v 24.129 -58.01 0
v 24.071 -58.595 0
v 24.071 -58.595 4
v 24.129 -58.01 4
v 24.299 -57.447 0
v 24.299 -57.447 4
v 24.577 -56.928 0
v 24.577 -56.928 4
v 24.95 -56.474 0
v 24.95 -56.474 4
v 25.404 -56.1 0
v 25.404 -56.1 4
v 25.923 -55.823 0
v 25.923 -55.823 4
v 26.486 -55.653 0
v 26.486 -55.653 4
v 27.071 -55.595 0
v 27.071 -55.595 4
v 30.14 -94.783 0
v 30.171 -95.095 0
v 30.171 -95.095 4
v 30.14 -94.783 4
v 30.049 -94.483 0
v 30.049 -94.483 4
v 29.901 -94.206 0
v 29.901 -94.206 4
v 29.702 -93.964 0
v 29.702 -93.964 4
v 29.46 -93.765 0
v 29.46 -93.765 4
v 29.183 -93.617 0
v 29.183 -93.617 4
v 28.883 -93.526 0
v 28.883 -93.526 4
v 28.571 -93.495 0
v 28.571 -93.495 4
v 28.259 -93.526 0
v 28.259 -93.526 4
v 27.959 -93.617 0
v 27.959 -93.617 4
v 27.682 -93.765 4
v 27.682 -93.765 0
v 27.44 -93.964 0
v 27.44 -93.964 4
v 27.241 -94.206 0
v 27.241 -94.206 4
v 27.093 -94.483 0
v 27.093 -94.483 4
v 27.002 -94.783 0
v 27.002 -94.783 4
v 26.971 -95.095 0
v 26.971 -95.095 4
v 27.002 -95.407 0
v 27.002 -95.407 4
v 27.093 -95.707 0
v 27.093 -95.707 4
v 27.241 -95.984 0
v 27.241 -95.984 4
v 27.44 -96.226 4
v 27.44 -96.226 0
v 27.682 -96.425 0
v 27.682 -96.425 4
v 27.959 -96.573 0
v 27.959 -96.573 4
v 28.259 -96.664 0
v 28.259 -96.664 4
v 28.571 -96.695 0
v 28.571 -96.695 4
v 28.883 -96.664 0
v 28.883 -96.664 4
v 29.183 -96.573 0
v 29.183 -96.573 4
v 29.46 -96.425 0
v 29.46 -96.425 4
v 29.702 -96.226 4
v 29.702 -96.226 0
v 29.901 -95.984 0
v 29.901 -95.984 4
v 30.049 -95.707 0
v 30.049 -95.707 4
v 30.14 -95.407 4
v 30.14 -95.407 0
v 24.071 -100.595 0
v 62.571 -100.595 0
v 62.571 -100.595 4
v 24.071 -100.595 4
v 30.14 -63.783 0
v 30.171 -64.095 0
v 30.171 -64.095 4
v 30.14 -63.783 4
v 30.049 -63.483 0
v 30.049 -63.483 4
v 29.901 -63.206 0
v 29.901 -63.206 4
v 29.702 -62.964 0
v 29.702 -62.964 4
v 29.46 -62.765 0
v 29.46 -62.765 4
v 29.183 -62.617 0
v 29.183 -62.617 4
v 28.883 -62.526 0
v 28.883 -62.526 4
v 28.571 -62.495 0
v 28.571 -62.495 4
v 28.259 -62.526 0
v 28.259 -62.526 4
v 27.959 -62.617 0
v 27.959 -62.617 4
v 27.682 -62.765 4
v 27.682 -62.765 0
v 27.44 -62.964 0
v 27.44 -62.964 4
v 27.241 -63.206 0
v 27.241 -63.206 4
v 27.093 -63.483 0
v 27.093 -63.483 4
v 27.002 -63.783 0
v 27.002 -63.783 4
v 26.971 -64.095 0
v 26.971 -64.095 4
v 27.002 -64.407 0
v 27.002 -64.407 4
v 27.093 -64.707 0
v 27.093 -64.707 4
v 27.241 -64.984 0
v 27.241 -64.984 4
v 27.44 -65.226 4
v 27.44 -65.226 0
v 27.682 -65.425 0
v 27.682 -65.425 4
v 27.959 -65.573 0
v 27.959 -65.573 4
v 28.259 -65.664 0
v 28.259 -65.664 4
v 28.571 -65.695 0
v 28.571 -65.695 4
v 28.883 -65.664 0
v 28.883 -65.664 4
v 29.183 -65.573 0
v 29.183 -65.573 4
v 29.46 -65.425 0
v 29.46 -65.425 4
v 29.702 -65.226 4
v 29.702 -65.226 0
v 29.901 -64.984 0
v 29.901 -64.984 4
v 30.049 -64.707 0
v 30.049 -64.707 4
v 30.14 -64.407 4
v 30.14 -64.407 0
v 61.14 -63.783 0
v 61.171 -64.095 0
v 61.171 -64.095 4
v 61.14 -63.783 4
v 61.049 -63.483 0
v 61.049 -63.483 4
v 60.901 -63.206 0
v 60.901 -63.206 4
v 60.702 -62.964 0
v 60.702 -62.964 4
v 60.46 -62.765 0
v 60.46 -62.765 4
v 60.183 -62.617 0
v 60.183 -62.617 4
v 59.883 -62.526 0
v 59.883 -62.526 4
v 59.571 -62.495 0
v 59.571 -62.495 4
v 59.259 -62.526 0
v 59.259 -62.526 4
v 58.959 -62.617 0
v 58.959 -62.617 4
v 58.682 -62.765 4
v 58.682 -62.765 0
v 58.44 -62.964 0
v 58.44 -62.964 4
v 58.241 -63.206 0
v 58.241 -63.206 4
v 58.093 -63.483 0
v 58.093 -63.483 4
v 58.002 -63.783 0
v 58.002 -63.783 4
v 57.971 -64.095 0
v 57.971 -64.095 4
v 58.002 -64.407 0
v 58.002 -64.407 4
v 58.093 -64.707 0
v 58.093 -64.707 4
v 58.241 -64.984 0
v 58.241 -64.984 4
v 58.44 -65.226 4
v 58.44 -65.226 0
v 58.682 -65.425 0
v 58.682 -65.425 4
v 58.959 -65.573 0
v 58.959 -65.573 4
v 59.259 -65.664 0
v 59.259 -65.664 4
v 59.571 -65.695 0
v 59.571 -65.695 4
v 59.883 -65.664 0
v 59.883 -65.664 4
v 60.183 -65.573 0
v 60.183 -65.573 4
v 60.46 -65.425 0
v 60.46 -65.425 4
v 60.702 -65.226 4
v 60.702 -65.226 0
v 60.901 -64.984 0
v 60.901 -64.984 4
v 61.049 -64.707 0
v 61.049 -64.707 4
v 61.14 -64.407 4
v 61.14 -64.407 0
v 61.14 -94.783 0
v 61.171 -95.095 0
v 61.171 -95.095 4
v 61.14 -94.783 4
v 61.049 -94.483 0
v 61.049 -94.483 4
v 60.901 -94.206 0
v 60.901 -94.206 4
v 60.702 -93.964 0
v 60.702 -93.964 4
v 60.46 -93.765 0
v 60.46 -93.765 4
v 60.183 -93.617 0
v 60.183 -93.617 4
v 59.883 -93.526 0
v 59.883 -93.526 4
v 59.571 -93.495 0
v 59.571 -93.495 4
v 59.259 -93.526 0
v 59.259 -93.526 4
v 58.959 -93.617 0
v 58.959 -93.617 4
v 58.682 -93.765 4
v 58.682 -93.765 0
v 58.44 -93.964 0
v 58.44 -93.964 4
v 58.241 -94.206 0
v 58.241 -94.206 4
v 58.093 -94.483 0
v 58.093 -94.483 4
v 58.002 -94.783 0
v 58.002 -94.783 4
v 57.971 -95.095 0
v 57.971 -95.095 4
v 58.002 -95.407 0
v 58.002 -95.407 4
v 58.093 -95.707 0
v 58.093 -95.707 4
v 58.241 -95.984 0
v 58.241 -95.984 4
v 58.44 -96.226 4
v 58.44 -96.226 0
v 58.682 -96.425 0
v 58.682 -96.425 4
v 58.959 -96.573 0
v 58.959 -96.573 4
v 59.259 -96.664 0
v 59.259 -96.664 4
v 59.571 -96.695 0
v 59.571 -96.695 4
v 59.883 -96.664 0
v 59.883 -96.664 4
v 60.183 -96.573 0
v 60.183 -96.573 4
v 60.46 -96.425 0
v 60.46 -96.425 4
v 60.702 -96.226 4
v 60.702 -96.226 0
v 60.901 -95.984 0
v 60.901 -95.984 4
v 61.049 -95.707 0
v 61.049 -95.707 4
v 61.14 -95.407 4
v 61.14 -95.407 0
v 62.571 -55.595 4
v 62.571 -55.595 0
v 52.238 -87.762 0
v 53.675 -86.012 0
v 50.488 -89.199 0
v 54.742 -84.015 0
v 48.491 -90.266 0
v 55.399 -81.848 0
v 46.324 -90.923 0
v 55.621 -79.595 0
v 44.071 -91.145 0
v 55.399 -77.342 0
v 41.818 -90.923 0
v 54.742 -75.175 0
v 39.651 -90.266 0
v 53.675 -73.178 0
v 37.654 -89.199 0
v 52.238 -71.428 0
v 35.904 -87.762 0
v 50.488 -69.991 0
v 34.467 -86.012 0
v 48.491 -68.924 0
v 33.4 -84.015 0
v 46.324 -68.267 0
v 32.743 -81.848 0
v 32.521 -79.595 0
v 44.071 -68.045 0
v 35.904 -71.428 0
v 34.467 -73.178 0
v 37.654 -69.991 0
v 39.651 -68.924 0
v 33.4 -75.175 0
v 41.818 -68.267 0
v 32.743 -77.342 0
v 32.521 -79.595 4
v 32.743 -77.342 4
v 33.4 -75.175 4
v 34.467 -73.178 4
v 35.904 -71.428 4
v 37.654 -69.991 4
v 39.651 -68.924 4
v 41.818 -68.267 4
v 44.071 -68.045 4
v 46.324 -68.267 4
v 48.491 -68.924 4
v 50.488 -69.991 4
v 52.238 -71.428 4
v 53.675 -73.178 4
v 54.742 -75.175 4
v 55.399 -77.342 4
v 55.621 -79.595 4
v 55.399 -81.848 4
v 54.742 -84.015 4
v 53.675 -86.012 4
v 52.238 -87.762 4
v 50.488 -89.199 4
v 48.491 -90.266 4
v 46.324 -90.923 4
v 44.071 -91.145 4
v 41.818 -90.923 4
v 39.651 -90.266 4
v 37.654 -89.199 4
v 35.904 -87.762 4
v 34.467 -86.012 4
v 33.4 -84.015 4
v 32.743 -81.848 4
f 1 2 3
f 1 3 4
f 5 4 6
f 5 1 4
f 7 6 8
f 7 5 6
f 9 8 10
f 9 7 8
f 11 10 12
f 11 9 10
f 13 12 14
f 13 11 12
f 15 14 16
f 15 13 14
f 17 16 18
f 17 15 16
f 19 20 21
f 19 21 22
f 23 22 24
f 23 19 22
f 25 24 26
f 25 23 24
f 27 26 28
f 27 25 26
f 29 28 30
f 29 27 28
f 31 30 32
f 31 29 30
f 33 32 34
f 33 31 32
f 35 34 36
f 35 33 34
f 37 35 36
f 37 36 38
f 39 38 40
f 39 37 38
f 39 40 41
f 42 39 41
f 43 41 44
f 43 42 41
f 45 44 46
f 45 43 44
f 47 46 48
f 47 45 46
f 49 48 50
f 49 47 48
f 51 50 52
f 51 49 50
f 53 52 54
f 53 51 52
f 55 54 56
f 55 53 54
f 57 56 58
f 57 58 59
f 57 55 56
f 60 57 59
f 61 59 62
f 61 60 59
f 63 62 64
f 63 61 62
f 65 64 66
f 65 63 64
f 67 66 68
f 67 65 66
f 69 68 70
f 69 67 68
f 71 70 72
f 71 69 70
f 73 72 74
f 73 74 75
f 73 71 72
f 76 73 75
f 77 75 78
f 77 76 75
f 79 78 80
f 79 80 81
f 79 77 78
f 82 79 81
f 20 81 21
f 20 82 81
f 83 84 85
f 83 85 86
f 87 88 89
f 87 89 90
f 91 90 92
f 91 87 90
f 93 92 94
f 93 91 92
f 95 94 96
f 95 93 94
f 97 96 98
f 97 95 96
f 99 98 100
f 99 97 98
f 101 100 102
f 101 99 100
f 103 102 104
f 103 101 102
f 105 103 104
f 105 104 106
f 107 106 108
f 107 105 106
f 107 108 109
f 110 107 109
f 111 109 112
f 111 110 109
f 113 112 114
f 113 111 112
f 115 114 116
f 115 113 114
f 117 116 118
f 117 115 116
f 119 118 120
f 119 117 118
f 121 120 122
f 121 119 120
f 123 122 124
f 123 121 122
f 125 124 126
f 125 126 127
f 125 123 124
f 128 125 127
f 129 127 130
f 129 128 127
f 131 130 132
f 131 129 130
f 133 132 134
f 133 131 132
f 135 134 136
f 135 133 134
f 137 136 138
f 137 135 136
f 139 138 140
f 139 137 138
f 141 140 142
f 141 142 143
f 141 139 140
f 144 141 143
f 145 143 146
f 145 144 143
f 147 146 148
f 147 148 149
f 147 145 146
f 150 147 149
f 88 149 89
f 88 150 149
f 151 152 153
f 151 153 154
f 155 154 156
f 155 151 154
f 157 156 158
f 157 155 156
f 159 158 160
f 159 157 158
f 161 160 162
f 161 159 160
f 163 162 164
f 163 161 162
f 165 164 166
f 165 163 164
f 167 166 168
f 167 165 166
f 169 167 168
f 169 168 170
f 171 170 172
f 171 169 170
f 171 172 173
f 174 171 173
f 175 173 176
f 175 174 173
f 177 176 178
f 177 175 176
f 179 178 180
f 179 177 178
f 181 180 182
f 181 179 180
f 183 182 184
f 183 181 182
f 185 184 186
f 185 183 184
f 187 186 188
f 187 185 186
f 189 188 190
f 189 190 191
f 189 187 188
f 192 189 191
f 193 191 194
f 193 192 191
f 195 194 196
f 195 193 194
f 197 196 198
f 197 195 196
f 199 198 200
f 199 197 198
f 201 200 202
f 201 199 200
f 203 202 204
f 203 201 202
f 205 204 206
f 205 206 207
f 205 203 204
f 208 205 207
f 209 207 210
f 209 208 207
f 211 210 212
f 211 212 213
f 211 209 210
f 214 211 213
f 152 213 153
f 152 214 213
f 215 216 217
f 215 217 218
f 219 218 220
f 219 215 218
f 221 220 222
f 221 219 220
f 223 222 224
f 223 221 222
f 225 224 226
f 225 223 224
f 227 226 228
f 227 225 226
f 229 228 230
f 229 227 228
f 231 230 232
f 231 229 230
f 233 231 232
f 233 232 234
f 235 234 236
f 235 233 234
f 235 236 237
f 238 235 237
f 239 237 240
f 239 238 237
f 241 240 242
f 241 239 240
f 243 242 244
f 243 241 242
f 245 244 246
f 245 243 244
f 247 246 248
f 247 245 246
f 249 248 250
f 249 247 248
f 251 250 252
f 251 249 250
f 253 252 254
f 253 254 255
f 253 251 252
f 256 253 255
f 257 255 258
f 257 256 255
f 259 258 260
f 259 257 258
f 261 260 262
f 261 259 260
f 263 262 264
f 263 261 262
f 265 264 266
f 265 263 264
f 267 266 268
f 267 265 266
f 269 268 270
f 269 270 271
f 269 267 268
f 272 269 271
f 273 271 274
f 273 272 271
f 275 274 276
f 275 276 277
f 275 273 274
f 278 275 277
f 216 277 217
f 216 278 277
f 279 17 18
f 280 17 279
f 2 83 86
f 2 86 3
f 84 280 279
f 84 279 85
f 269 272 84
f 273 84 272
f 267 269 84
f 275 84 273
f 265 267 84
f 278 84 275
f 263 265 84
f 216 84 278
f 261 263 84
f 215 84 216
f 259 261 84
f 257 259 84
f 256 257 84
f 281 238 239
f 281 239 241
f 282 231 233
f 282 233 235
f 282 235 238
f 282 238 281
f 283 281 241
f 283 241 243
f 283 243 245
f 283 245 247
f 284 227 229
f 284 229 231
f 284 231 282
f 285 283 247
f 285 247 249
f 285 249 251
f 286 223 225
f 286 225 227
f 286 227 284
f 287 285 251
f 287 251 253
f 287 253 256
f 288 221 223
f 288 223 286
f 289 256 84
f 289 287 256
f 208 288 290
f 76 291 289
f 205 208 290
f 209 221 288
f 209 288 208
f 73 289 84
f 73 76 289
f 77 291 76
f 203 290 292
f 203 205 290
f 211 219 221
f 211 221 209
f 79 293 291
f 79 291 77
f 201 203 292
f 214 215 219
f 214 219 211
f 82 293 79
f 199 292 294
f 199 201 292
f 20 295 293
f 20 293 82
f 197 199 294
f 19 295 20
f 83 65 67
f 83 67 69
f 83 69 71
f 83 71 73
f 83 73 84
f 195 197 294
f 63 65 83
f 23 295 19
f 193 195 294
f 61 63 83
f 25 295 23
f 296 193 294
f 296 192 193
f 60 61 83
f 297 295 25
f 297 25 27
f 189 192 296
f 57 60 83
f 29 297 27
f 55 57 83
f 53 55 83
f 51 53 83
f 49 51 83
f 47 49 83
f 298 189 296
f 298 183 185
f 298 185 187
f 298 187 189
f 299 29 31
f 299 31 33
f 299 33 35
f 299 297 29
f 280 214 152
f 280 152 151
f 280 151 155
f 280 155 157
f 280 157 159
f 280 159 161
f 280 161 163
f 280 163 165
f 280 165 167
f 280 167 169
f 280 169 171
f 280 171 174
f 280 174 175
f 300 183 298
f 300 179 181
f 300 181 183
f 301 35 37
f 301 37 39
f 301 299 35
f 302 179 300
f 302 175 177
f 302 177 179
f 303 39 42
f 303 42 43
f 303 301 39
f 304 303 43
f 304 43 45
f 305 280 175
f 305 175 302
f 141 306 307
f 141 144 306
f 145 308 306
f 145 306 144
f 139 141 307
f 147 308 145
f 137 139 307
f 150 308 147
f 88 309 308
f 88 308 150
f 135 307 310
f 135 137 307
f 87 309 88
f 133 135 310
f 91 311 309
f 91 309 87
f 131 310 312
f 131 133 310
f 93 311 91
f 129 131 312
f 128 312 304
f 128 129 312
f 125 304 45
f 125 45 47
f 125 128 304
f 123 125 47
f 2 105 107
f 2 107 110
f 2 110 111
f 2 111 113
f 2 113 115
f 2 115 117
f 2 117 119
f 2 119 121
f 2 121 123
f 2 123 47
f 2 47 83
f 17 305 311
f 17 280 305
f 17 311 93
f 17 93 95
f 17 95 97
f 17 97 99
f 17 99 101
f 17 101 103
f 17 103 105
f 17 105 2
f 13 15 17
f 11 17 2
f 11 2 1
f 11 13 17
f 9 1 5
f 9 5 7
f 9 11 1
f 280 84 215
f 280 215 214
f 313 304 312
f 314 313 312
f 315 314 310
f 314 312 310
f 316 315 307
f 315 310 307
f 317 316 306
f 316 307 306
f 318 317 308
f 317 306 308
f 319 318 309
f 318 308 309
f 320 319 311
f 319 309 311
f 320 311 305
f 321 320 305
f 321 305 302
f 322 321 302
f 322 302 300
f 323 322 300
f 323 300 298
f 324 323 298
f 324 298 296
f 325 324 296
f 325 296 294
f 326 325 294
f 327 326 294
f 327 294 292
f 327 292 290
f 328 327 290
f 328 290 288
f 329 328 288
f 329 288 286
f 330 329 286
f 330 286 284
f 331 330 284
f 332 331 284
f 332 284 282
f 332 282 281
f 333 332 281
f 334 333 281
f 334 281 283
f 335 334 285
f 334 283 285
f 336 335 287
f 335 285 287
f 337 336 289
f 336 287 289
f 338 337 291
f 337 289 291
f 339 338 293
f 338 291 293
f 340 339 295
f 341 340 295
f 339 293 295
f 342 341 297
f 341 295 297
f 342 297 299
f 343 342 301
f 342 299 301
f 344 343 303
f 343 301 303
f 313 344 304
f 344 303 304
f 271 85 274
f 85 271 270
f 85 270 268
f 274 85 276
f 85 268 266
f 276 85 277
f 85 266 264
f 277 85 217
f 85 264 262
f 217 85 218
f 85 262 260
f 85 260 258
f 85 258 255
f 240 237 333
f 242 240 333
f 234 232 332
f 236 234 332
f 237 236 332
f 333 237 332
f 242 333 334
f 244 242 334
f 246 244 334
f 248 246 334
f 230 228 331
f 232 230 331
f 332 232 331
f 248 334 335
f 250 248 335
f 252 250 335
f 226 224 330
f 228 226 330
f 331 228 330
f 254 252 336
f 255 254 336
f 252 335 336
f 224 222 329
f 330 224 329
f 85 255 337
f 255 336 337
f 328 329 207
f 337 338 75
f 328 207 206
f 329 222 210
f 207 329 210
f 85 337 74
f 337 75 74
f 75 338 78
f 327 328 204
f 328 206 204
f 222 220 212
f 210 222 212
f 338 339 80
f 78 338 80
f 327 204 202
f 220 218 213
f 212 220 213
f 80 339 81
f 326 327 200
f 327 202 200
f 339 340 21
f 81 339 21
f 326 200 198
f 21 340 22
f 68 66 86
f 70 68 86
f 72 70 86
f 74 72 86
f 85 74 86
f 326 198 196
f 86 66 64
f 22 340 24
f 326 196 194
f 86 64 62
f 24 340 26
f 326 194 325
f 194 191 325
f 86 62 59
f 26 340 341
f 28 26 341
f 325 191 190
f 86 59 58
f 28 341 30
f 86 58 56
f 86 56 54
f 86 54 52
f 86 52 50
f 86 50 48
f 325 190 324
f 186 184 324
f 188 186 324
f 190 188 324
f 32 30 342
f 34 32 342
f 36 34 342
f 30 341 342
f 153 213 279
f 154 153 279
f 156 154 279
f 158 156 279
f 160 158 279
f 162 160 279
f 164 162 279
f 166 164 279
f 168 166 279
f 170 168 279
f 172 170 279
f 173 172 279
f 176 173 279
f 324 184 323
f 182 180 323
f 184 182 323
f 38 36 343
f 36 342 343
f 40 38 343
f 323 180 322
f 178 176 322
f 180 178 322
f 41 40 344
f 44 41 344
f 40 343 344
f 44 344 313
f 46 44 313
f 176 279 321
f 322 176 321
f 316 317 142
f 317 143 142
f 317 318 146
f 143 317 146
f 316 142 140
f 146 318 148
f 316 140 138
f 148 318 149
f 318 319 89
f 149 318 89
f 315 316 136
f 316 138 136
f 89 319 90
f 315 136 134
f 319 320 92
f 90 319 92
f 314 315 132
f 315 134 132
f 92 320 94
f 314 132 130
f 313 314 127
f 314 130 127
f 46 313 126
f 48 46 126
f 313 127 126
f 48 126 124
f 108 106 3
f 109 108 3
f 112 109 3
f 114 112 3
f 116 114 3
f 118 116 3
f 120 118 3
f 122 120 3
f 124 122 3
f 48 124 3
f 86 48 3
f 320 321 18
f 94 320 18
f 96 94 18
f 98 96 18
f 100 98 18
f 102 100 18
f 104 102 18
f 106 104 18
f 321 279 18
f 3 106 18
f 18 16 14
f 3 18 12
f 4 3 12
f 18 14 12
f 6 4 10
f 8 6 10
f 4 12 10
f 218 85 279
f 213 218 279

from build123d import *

# Parameters (mm, degrees)
SKETCH1_R           = 1.6
SKETCH1_R_2         = 3
BOSS_EXTRUDE1_DEPTH = 4
SKETCH2_R           = 11.550203763
CUT_EXTRUDE1_DEPTH  = 5


with BuildPart() as part:
    # Sketch1 → Boss-Extrude1 (new body)
    with BuildSketch(Plane.XY):
        with BuildLine():
            Line((27.071068699, -55.594908829), (62.571068699, -55.594908829))
            Line((62.571068699, -55.594908829), (62.571068699, -100.594908829))
            Line((62.571068699, -100.594908829), (24.071068699, -100.594908829))
            Line((24.071068699, -100.594908829), (24.071068699, -58.594908829))
            ThreePointArc((24.071068699, -58.594908829), (24.949748355, -56.473588486), (27.071068699, -55.594908829))
        make_face()
        with Locations((28.571068699, -64.094908829)):
            Circle(SKETCH1_R, mode=Mode.SUBTRACT)
        with Locations((44.071068699, -79.594908829)):
            Circle(SKETCH1_R_2, mode=Mode.SUBTRACT)
        with Locations((59.571068699, -64.094908829)):
            Circle(SKETCH1_R, mode=Mode.SUBTRACT)
        with Locations((28.571068699, -95.094908829)):
            Circle(SKETCH1_R, mode=Mode.SUBTRACT)
        with Locations((59.571068699, -95.094908829)):
            Circle(SKETCH1_R, mode=Mode.SUBTRACT)
    extrude(amount=BOSS_EXTRUDE1_DEPTH)

    # Sketch2 → Cut-Extrude1 (cut)
    with BuildSketch(Plane(origin=(0, 0, 0), x_dir=(-1, 0, 0), z_dir=(0, 0, -1))):
        with Locations((-44.071068699, -79.594908829)):
            Circle(SKETCH2_R)
    extrude(amount=-CUT_EXTRUDE1_DEPTH, mode=Mode.SUBTRACT)


solid = part.part
